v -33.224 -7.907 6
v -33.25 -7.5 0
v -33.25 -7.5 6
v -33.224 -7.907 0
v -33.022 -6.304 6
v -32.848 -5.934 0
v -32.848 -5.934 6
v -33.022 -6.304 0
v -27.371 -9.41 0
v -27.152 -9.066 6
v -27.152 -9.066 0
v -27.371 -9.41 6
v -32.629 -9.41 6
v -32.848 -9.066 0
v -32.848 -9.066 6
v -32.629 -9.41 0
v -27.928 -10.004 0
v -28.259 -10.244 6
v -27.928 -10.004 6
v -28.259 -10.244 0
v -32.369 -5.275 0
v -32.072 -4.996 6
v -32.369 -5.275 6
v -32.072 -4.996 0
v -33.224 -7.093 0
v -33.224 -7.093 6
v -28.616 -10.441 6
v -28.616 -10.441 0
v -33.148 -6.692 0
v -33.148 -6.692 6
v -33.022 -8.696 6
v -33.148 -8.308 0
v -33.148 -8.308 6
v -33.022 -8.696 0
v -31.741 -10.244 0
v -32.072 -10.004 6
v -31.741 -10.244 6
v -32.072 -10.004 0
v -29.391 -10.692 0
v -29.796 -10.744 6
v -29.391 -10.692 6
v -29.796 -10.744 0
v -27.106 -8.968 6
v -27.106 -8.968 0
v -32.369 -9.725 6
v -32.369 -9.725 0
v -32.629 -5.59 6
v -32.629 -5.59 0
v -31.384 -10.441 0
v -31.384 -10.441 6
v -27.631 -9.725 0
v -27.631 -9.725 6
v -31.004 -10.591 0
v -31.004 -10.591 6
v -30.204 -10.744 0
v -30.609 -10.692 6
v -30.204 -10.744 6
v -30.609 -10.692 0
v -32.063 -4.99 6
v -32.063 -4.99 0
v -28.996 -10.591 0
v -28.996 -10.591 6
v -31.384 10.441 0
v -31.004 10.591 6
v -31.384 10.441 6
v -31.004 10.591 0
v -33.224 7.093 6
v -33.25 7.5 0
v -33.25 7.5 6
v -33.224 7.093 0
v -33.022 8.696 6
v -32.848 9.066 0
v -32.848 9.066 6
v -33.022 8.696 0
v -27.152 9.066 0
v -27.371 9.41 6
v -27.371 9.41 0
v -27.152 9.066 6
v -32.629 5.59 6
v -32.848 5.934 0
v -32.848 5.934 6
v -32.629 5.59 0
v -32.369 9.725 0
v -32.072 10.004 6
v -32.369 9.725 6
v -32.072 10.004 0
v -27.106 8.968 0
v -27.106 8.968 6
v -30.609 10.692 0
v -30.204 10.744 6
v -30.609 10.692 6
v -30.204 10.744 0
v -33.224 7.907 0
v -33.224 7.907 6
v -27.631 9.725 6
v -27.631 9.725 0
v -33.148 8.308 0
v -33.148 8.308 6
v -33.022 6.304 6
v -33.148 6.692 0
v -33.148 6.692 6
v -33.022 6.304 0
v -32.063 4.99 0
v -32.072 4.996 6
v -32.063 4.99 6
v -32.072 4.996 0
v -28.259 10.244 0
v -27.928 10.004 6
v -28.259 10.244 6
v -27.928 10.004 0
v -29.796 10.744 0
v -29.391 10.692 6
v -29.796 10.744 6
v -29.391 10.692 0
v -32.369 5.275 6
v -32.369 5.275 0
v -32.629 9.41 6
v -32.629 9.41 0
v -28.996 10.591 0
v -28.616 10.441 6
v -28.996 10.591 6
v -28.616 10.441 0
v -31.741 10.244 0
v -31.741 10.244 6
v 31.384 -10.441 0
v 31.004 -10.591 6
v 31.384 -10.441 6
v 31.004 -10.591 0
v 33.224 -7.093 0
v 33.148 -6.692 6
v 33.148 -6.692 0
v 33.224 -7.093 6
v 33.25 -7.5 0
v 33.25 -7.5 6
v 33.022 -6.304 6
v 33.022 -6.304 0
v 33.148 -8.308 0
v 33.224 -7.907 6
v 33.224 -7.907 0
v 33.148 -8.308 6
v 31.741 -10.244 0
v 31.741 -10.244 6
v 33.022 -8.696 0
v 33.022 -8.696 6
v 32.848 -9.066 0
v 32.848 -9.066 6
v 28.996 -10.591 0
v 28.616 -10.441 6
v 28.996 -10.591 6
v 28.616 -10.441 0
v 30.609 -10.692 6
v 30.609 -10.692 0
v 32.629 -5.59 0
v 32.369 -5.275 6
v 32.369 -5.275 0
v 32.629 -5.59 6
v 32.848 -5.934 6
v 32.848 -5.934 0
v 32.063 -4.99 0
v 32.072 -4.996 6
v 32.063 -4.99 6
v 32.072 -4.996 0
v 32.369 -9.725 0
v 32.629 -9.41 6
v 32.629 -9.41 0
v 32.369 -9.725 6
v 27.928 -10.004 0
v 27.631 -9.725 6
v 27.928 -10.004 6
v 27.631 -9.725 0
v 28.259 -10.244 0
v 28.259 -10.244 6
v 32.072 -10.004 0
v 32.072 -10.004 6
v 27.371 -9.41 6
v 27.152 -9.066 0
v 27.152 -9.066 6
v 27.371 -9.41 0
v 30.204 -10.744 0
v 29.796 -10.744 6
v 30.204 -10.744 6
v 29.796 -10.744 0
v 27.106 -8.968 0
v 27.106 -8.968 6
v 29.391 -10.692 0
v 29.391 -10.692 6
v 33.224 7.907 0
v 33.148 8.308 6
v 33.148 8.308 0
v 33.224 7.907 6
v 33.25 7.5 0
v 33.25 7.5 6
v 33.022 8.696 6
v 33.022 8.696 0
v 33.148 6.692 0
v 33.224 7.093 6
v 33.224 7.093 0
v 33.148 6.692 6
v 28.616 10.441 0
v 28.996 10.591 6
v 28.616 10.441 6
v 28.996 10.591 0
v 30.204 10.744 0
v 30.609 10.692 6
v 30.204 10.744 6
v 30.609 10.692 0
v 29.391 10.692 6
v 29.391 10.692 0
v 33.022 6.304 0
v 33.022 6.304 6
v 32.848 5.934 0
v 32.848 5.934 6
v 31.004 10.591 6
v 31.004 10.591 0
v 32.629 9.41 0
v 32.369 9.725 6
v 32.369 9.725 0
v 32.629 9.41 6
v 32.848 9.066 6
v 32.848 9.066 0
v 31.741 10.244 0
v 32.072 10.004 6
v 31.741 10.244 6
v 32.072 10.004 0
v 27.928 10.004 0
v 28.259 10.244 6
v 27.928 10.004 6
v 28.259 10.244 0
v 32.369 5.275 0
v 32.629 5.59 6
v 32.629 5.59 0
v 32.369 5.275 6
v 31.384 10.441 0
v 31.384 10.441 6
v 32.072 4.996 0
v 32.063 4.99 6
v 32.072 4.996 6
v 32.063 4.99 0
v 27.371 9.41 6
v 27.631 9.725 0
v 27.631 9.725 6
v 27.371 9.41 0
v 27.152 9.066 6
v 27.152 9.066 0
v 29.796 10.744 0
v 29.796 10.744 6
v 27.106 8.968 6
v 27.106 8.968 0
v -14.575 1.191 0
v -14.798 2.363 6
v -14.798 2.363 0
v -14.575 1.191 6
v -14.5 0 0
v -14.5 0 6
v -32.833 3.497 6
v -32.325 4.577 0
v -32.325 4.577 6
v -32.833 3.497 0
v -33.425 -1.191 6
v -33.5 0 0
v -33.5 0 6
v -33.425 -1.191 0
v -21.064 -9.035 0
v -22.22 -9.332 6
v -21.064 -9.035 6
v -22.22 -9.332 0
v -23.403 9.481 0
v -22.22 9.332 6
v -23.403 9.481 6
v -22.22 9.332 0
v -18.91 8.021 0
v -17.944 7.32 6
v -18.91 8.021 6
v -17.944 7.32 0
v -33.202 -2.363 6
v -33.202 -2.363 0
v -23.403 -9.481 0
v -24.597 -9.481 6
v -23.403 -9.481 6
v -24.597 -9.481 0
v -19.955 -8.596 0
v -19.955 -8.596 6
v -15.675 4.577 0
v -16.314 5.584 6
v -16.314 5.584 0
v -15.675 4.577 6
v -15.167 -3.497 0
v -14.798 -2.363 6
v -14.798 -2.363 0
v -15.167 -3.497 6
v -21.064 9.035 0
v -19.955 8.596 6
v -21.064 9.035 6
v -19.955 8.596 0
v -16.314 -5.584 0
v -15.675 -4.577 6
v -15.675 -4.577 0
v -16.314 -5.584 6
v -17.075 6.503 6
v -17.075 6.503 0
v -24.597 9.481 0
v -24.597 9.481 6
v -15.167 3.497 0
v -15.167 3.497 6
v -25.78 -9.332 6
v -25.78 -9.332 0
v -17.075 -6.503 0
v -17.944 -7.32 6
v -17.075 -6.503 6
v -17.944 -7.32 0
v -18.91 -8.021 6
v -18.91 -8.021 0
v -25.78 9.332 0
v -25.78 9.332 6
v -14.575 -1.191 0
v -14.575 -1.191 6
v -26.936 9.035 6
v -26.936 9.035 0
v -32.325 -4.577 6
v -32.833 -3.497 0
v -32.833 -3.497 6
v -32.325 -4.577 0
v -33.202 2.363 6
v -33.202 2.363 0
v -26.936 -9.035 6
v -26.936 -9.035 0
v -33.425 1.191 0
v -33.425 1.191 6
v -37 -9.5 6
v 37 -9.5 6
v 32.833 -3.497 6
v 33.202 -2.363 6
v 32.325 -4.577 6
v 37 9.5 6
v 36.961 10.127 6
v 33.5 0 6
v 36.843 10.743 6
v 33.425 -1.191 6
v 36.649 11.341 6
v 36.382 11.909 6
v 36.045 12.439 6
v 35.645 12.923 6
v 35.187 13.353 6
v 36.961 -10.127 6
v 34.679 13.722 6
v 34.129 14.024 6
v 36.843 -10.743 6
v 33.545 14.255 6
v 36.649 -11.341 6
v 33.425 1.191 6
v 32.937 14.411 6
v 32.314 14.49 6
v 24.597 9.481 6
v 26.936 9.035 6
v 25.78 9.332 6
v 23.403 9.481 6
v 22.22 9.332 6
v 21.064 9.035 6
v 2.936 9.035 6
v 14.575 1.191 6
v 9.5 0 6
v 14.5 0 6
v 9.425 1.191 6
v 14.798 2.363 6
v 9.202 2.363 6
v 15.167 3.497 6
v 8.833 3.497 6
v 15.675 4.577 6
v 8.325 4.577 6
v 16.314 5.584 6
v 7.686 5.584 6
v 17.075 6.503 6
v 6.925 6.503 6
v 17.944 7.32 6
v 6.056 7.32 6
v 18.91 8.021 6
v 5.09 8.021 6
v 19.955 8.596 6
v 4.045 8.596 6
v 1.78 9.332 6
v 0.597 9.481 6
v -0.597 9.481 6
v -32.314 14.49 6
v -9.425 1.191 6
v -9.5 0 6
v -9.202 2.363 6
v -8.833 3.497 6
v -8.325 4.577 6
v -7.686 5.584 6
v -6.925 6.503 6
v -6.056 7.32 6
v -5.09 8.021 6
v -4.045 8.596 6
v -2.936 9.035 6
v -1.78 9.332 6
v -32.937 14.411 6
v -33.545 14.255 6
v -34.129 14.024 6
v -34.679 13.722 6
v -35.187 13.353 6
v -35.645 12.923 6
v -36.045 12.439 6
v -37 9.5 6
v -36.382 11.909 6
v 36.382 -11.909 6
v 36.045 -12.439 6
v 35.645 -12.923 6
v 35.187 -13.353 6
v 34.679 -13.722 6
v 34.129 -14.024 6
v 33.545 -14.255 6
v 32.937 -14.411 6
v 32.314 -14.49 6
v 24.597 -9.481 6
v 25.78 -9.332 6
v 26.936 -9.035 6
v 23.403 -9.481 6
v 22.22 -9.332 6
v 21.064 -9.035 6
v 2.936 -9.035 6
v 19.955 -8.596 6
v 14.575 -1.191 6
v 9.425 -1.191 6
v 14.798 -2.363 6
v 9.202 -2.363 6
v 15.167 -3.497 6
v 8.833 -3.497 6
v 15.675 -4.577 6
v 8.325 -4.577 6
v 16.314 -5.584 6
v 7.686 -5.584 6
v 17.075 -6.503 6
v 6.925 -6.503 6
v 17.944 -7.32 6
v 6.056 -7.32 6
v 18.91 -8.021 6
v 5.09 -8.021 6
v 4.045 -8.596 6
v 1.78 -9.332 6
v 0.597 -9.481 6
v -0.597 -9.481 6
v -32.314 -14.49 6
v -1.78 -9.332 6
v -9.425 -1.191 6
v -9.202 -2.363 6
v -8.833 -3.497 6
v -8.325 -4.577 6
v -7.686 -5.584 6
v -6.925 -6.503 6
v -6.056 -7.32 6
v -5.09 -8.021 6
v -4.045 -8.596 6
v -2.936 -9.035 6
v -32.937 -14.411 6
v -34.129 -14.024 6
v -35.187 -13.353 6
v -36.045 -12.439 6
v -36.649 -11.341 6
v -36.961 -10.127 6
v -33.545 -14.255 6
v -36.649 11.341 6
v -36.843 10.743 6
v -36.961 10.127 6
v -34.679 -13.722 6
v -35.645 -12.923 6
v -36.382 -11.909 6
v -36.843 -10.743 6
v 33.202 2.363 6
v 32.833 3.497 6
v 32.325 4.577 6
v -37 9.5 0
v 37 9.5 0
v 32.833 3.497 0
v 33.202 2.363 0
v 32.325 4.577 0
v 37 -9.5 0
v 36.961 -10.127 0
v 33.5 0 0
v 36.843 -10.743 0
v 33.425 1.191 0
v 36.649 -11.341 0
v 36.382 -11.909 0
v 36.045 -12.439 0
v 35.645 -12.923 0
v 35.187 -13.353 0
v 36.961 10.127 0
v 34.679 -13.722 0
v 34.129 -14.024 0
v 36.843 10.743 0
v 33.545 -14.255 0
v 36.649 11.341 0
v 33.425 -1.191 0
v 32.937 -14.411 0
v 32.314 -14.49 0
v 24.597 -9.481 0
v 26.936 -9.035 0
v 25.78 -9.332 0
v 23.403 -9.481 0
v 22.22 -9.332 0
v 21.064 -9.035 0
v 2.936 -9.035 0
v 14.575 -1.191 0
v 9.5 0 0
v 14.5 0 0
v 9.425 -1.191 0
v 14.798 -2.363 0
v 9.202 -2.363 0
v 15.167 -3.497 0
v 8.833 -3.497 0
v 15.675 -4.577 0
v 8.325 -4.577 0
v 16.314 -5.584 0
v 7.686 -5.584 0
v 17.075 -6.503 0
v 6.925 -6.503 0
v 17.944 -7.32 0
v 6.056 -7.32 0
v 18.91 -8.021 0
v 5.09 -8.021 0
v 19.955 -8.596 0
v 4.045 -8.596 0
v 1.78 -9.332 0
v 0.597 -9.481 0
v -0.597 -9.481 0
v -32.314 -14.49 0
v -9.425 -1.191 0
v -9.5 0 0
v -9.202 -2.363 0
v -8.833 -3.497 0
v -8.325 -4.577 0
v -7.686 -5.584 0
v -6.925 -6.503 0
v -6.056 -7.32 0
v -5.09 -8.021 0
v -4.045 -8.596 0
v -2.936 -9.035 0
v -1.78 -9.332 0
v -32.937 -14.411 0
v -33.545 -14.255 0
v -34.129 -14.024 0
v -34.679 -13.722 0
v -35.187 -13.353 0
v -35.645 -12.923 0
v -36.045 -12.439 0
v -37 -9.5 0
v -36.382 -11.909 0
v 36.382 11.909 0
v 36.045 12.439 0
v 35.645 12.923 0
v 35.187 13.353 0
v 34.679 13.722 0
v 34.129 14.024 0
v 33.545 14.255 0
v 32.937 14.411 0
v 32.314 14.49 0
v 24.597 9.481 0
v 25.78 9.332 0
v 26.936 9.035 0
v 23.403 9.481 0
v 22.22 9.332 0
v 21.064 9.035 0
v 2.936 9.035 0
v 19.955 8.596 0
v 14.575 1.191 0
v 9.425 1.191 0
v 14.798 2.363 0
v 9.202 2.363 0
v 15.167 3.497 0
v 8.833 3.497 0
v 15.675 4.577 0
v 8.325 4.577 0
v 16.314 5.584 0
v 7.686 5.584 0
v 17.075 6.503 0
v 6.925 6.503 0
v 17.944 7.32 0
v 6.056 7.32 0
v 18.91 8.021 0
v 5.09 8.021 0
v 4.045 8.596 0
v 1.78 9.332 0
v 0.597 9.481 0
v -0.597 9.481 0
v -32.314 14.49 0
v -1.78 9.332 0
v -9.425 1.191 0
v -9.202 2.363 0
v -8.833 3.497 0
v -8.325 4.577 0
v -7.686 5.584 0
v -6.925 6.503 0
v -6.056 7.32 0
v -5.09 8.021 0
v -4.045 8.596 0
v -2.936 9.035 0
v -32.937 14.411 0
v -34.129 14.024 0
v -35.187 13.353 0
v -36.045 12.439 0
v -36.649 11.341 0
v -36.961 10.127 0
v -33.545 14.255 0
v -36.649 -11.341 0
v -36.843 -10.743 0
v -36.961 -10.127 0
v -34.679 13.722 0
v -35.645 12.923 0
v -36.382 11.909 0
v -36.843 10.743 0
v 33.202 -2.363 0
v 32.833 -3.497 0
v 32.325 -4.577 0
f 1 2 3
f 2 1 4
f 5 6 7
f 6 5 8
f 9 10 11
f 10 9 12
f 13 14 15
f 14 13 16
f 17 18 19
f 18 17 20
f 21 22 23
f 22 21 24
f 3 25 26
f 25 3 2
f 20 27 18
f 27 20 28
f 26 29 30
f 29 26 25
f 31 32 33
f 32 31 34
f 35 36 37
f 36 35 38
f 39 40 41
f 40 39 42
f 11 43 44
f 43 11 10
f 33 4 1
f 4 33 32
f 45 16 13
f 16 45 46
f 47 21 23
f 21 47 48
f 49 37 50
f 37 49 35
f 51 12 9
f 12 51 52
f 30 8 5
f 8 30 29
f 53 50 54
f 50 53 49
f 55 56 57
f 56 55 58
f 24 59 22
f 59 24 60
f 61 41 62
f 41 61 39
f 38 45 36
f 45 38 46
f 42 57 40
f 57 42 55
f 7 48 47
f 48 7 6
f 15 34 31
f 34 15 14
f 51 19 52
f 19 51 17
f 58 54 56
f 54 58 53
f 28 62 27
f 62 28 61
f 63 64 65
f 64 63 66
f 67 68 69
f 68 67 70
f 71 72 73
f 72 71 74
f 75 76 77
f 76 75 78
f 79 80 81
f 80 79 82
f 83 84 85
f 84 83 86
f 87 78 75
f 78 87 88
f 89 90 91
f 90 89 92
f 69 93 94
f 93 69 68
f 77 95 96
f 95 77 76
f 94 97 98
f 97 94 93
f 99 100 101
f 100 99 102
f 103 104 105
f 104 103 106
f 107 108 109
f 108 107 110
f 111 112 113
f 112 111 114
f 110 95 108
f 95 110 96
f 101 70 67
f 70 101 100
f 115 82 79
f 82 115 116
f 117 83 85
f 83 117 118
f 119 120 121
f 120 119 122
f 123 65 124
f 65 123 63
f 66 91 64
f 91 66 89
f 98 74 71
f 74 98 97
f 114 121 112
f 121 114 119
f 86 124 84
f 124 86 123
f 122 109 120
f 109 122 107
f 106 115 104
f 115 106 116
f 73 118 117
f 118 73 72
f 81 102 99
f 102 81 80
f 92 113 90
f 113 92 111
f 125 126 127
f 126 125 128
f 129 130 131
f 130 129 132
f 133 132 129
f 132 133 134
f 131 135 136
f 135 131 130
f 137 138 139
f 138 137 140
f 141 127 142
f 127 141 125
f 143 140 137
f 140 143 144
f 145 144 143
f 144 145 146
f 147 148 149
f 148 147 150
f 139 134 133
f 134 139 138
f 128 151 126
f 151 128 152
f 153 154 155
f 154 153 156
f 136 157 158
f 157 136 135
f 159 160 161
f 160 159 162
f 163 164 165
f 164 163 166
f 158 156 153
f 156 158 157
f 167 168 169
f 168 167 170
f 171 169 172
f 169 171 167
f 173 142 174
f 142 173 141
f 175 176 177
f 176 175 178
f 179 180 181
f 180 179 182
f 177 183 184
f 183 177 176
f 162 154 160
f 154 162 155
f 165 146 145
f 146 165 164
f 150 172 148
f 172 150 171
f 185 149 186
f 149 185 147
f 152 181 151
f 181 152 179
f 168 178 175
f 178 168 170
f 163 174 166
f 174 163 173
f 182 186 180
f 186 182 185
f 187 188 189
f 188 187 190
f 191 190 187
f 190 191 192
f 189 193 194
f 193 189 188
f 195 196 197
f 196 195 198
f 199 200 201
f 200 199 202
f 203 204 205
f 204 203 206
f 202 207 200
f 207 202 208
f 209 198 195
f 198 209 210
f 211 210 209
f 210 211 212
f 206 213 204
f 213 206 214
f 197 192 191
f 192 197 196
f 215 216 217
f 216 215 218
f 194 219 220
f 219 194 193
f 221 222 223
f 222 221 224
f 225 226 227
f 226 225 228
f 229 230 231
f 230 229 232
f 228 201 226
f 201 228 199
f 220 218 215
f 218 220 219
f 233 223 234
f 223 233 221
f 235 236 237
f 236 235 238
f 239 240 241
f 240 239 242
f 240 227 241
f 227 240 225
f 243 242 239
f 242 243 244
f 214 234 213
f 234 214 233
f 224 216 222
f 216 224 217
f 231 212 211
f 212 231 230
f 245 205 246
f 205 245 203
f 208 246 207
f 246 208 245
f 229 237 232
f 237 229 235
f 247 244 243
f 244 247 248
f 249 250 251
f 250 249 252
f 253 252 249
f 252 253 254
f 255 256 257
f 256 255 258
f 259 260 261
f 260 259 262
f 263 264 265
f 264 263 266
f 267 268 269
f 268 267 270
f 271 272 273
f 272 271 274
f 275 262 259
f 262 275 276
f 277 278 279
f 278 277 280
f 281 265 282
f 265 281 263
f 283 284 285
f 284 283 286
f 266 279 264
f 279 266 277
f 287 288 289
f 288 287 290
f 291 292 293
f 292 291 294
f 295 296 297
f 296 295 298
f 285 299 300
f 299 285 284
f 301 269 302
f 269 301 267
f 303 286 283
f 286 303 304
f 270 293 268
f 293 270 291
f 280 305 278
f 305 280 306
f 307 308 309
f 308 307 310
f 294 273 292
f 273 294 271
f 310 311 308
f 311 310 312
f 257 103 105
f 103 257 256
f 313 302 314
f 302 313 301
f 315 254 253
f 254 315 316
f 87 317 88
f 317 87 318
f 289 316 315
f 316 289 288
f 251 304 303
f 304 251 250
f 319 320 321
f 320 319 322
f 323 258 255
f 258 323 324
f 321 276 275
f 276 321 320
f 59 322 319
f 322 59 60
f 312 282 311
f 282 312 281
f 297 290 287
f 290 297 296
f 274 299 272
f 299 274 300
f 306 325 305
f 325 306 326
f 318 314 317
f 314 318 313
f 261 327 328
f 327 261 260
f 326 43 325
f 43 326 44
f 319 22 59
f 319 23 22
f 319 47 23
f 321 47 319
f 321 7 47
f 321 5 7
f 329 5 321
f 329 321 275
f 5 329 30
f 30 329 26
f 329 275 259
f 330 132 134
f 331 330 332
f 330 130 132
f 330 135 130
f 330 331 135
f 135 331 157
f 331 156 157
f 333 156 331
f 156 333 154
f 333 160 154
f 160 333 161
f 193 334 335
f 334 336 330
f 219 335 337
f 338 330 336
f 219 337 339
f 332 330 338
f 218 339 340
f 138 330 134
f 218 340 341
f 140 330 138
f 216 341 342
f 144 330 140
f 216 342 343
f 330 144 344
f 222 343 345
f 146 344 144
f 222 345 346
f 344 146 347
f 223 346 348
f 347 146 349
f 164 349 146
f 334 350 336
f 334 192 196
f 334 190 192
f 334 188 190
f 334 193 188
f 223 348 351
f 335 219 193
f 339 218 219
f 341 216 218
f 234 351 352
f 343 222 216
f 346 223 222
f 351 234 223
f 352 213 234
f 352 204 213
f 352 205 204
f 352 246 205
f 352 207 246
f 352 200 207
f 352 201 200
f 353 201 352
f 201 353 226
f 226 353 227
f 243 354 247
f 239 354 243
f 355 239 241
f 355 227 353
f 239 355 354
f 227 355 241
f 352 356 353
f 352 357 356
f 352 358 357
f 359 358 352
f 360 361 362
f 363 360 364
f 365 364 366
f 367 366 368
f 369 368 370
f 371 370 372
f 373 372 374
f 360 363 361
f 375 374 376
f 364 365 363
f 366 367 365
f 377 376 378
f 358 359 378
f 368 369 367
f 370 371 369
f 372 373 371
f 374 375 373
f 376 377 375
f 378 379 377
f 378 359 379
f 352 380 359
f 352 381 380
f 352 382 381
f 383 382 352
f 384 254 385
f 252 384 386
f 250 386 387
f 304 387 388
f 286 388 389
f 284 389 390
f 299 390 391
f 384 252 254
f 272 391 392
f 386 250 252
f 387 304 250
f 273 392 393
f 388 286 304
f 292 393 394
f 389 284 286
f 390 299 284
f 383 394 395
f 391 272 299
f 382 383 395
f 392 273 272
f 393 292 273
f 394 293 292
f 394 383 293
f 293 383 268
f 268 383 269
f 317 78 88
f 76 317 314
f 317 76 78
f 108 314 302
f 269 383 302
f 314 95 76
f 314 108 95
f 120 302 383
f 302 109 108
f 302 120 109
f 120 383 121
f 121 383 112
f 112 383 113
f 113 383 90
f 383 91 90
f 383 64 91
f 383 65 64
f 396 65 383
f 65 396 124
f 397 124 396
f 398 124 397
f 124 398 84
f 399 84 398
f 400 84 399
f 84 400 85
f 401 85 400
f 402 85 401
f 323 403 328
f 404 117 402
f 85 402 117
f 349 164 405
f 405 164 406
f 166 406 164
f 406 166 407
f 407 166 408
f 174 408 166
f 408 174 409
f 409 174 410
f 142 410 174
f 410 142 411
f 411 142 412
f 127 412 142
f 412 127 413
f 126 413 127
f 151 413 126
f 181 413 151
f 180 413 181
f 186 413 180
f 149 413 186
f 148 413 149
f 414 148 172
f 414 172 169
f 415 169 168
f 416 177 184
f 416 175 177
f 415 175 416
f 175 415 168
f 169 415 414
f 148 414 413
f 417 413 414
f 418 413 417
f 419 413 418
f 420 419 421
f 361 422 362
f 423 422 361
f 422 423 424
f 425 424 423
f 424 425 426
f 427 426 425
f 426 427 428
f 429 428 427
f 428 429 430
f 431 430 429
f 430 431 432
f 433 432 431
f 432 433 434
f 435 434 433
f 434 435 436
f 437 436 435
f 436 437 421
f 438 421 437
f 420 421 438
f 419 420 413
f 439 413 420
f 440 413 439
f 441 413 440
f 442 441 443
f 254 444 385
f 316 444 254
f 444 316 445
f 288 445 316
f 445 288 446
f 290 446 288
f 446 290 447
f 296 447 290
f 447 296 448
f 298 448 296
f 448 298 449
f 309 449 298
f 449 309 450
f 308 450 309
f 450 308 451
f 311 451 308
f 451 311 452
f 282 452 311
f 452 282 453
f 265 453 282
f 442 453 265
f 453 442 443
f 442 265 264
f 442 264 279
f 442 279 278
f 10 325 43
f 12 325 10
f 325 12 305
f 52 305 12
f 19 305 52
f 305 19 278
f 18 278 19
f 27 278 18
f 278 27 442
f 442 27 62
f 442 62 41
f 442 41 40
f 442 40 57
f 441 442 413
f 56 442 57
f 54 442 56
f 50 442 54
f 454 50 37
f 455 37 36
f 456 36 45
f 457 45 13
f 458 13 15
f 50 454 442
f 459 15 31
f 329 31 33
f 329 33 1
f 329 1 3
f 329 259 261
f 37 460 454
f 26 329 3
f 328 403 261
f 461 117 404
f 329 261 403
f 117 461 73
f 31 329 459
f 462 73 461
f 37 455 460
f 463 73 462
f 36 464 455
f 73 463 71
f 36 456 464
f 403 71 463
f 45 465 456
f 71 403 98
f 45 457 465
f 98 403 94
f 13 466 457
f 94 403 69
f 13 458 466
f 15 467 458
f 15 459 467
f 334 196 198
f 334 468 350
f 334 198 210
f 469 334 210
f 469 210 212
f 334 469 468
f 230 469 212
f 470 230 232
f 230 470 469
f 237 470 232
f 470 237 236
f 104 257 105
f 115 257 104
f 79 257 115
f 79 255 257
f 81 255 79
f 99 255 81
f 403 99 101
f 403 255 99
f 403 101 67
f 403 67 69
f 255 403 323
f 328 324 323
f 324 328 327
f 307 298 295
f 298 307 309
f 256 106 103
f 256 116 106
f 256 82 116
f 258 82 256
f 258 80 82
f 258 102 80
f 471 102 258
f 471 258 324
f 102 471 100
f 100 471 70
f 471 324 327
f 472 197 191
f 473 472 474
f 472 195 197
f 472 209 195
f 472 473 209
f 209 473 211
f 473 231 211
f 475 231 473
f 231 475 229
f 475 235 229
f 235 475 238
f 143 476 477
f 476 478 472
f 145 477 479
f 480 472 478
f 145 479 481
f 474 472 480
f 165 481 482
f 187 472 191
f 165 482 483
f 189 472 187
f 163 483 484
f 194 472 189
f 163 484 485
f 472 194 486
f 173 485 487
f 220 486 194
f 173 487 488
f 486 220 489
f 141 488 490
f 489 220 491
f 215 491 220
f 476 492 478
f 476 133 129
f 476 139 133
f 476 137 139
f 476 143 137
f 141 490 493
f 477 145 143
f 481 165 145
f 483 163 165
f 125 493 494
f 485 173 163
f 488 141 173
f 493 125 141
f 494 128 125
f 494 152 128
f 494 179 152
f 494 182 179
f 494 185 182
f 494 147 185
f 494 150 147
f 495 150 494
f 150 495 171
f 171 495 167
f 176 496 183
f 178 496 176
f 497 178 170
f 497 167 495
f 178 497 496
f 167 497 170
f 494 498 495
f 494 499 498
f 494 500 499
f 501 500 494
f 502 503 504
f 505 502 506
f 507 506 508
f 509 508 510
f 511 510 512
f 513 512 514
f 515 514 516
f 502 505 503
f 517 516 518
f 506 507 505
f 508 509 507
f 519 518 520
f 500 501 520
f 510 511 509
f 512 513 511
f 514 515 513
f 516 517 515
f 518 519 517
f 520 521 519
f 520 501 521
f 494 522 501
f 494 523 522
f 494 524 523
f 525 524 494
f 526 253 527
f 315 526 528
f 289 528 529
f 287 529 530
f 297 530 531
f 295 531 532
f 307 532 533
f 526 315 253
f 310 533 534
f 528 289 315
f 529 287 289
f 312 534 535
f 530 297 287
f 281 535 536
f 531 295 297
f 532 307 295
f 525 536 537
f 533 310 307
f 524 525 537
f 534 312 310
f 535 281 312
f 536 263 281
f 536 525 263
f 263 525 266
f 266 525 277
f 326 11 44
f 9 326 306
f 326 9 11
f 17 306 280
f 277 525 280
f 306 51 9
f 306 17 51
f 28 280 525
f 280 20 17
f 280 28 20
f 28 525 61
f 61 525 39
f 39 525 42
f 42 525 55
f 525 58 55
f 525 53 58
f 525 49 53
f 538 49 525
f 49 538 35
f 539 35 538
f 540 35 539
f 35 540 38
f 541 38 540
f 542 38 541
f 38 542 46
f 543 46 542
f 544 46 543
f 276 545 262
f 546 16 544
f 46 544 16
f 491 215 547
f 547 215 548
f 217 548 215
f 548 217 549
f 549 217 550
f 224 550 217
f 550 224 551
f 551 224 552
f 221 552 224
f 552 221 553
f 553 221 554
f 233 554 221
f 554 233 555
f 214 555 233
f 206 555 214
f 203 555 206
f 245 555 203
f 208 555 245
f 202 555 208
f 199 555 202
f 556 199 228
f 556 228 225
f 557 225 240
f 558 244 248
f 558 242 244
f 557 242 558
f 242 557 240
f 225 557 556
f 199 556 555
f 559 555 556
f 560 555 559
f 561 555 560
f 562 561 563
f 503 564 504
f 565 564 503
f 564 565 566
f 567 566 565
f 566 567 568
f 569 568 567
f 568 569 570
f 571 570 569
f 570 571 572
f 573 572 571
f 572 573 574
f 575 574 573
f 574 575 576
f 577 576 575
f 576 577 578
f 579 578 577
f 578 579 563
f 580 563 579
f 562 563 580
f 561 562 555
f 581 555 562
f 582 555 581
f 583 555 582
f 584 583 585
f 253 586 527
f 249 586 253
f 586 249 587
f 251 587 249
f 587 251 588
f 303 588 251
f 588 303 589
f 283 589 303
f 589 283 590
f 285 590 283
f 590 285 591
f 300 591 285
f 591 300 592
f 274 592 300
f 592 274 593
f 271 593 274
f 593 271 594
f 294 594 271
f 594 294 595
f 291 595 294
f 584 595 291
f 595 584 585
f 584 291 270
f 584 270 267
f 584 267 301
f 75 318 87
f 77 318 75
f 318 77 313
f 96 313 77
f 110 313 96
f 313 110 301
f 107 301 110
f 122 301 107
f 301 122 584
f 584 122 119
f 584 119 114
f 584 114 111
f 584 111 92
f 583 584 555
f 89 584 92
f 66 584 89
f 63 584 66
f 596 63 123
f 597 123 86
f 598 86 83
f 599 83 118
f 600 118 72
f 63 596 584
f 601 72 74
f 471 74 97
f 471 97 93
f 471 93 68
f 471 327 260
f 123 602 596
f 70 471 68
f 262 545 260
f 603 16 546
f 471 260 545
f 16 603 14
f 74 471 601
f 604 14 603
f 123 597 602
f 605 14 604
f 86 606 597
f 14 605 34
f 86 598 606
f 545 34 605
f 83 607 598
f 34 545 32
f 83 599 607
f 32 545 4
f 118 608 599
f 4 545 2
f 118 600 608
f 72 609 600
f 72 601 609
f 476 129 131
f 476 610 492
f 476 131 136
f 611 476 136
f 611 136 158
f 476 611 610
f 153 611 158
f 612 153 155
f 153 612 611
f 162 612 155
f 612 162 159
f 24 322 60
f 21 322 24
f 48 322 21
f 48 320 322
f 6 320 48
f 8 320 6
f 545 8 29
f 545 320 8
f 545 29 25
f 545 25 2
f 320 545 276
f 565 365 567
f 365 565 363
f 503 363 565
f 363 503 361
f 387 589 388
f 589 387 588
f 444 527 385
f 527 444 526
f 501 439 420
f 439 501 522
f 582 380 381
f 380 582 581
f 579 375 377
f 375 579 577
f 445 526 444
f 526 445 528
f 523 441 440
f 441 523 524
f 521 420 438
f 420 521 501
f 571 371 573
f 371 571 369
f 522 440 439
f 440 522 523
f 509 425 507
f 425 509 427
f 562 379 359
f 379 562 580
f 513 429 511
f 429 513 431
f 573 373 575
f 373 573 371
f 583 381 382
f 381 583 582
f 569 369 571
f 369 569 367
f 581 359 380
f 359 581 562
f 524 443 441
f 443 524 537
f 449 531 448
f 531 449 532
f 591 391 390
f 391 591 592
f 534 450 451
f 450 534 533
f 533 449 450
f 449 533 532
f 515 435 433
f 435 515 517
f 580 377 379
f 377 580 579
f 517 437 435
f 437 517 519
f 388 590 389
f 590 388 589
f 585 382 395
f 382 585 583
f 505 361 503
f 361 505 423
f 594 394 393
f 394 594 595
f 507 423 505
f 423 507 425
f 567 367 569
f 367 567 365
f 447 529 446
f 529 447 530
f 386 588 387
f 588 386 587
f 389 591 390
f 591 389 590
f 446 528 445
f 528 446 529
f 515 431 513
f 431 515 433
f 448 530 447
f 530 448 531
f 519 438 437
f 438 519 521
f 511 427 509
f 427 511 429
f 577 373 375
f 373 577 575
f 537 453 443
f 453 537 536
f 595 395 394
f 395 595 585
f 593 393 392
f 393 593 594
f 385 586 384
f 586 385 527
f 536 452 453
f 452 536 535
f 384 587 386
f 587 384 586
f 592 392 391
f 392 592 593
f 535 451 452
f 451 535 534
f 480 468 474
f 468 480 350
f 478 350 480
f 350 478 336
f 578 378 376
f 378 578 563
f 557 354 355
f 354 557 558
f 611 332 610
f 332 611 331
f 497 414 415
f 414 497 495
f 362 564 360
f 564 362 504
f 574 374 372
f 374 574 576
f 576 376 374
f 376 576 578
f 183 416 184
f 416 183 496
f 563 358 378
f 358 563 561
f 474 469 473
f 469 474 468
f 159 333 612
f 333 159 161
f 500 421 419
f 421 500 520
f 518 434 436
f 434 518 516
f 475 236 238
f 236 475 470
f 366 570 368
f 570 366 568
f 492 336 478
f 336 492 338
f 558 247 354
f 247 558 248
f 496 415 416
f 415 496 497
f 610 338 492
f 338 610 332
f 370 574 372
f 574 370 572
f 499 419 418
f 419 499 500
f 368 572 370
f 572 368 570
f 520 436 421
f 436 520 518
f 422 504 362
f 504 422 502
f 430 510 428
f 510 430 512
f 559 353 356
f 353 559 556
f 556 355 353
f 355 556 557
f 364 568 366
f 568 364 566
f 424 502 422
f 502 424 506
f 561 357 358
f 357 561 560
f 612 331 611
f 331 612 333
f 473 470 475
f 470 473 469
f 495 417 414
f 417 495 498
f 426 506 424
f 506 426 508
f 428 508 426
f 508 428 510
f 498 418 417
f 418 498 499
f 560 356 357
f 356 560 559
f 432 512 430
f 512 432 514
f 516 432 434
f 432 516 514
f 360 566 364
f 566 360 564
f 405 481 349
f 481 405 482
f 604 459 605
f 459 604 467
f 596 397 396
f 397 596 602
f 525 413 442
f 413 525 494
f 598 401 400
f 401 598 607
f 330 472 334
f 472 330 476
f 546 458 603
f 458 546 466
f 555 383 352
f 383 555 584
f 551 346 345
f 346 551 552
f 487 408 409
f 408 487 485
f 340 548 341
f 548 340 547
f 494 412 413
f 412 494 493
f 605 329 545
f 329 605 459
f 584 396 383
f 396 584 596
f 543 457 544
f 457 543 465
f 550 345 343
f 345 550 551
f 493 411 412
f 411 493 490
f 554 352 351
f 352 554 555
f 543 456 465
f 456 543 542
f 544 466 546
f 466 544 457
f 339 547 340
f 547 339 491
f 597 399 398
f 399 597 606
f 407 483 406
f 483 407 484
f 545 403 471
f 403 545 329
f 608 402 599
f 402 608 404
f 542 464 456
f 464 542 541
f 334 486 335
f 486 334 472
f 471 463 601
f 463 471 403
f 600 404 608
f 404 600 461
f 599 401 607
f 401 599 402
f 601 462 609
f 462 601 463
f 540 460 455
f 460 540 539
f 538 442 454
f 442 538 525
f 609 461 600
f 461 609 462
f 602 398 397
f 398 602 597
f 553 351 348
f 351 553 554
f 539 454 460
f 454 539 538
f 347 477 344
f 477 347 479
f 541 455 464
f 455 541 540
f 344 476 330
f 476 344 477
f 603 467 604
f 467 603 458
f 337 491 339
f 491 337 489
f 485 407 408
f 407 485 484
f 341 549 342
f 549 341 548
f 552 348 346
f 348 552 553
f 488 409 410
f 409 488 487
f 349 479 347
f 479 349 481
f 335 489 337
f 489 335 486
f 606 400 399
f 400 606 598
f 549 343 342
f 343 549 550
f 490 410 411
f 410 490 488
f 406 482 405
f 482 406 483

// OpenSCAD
$fn = 50;

difference() {
	union() {
		hull() {
			translate(v = [-32.0, 9.5, 0]) {
				cylinder(h = 6, r = 5);
			}
			translate(v = [32.0, 9.5, 0]) {
				cylinder(h = 6, r = 5);
			}
			translate(v = [-32.0, -9.5, 0]) {
				cylinder(h = 6, r = 5);
			}
			translate(v = [32.0, -9.5, 0]) {
				cylinder(h = 6, r = 5);
			}
		}
	}
	union() {
		translate(v = [-30.0, -7.5, -100.0]) {
			cylinder(h = 200, r = 3.25);
		}
		translate(v = [-30.0, 7.5, -100.0]) {
			cylinder(h = 200, r = 3.25);
		}
		translate(v = [30.0, -7.5, -100.0]) {
			cylinder(h = 200, r = 3.25);
		}
		translate(v = [30.0, 7.5, -100.0]) {
			cylinder(h = 200, r = 3.25);
		}
		translate(v = [-30.0, -7.5, -100.0]) {
			cylinder(h = 200, r = 1.8);
		}
		translate(v = [-30.0, 7.5, -100.0]) {
			cylinder(h = 200, r = 1.8);
		}
		translate(v = [30.0, -7.5, -100.0]) {
			cylinder(h = 200, r = 1.8);
		}
		translate(v = [30.0, 7.5, -100.0]) {
			cylinder(h = 200, r = 1.8);
		}
		translate(v = [-24.0, 0, 0.0]) {
			cylinder(h = 6, r = 9.5);
		}
		cylinder(h = 6, r = 9.5);
		translate(v = [24.0, 0, 0.0]) {
			cylinder(h = 6, r = 9.5);
		}
	}
}
